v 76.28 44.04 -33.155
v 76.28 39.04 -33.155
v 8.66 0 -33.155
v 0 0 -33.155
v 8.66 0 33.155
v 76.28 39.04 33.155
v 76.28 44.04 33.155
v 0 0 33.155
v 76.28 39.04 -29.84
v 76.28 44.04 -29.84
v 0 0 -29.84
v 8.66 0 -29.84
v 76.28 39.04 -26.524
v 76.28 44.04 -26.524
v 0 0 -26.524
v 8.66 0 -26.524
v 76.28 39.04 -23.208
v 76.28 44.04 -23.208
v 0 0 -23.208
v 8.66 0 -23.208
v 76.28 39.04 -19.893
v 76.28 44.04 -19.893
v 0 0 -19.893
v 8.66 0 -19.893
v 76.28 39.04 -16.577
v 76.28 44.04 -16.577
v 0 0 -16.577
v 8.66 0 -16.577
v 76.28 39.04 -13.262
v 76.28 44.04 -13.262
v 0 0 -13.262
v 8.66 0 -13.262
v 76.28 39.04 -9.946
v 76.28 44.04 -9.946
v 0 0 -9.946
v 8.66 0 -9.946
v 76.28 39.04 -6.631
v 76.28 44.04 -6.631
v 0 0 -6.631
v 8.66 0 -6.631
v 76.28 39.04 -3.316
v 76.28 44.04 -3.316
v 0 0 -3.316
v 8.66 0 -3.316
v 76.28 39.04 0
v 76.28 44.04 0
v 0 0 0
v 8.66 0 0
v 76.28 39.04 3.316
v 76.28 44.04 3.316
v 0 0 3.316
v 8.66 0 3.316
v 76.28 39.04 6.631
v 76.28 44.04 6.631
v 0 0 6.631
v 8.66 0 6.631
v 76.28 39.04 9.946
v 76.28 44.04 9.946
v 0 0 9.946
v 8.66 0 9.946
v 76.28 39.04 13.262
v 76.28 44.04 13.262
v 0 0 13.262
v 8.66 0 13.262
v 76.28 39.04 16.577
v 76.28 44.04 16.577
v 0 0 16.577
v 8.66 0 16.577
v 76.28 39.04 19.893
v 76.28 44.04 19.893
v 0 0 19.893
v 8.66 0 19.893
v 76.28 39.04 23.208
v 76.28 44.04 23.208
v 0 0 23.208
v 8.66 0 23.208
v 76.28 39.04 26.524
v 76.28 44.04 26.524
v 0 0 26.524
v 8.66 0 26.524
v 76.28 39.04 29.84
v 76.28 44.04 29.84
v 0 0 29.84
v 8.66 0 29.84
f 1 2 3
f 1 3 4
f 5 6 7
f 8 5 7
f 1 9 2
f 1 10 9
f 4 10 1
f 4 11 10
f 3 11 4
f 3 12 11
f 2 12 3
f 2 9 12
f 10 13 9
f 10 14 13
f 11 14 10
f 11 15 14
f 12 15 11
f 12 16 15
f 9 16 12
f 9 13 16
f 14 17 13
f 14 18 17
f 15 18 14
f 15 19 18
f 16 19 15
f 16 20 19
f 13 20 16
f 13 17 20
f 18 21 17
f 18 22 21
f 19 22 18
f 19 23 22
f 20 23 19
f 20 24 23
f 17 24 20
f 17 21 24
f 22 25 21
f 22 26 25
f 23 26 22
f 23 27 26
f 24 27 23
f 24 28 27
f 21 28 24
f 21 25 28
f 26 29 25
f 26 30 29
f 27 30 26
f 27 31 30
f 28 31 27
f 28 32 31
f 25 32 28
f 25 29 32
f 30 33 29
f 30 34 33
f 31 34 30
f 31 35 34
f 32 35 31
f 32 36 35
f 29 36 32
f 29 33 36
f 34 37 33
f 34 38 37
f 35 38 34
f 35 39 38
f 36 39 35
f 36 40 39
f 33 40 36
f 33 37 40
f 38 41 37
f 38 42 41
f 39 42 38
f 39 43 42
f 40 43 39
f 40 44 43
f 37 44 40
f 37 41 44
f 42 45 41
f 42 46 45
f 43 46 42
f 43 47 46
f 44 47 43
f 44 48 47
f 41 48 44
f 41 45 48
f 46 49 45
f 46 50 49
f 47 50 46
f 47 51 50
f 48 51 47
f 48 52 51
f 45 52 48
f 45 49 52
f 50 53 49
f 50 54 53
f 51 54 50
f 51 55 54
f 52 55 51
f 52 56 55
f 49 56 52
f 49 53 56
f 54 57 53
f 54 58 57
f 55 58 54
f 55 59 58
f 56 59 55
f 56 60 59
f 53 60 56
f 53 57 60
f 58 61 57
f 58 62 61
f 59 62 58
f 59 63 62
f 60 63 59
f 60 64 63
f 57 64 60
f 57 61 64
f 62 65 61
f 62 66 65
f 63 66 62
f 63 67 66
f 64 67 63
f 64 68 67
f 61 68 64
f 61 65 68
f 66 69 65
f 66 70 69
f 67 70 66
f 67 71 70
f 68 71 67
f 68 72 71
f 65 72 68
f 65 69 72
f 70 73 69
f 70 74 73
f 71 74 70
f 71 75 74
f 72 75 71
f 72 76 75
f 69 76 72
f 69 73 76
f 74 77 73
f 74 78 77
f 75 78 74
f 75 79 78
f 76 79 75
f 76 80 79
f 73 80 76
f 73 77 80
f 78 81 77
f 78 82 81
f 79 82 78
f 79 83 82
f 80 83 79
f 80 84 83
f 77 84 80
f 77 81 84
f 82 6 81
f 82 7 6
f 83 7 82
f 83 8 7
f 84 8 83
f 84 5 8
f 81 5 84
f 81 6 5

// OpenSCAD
// file: calcs.scad
include <inputs.scad>

// CALCS (everything ends up in [mm])
robot_height = robot_height_in*cu-height_edge*cu*2; // height of the robot
robot_width = robot_width_in*cu-side_edge*cu*2; // width of the robot

base_bottom = base_clearance*cu; // height of the bottom of the base
base_top = base_bottom + base_thickness; // height of the top of the base

storage_size = storage_width*cu; // inside depth of storage area
storage_height = robot_height-base_top; // height of storage container
wire_hole = wire_hole_in*cu; // diameter of hole for wires under storage area

dump_height = dump_height_in*cu; // height that platform edge will raise to dump

shaft_width = robot_width - 2*storage_size - 2*thickness; // inside width of elevator shaft


cut_size = (robot_height-dump_height-base_top)/2+tol; // size of vertical cut for sliding together

shift = shaft_width/2 + thickness/2; // how much the pieces need to be shifted to be put together


wheel_opening_width = wheel_d; // width of opening for wheels on sub base
wheel_opening_depth = wheel_w + wheel_opening_depth_tol; // width of opening for wheels on sub base

drive_height = max(mount_motor_hole_offset,wheel_d/2) + max(mount_motor_hole_offset-mount_motor_hole_offset,wheel_d/2); // height of wheel, motor, and mount

sbase_top_height = drive_height + sbase_thickness; // height of the top of the sub base


false_bottom_height = false_bottom_height_in*cu; // height of false bottom in front

false_opening_height = false_opening_height_in*cu; // height of hole for false bottom


cut_height = base_bottom + false_opening_height - base_thickness; // height at which cuts will meet

bottom_cut_height = cut_height - base_top + tol; // height of bottom cut

top_cut_height = robot_height - dump_height - cut_height + tol; // height of top cut

el_step_height = el_step_height_in*cu; // height of steppers for elevator

// Checking
if (shaft_width < storage_size)
{
    echo("<b>THE STORAGE AREAS WILL BE TOO NARROW!!!!!!!!!!!!!!!!!!!!!!!!!!");
    echo("THIS IS A PROBLEM!!!!!!!!!!!!!!!!!!!!!!!!!!");
    echo("Width: ", shaft_width/cu, "[in]");
}
else
{
    echo("<b>Storage width will be:", shaft_width/cu, "[in]</b>");
}

echo("<b>Corner Size:", (robot_width-shaft_width-2*thickness)/2/cu, "[in]</b>");

// error check for sbase and base
if (sbase_top_height >= base_bottom)
{
    echo("<b>SUB BASE TOO TALL!!!!!!!!!!!!!!!!!!!!!!!!!!</b>");
}
else
{
    echo("<b>Spacer height should be:", (base_bottom - sbase_top_height)/cu, "[in]</b>");
}


echo(shaft_width/cu);
echo(storage_size/cu);
// file: inputs.scad
$fn = 50;
cu = 25.4; // inch -> mm

// INPUTS
thickness = 2; // thickness of the acrylic [mm]
base_thickness = 5; // thickness of the base acrylic [mm]

side_edge = 0.25; // clearance for each side of the robot [in]
height_edge = 0.1; // clearance for top and bottom of the robot [in]

robot_height_in = 11; // overall height of the robot [in]
robot_width_in = 9; // overall width of the robot [in]

base_clearance = 2.65; // clearance of the base to ground [in]

storage_width = 2.65; // inside width of storage container [in]

block_width = 5; // width of jigsaw block [mm]

dump_height_in = 1.75; // height that platform edge will raise to dump [in]

tol = 0.001; // number used to fix rounding? [mm]


sbase_thickness = 0; // thickness of the sub base [mm]

wheel_opening_depth_tol = 5; // extra space for wheel depth [mm]

hole_dist_opposing = 33.98; // distance between middles of opposing mounting holes [mm]

hole_dist_adjacent = 6.36; // distance between middles of adjacent mounting holes [mm]

hole_diameter = 3.26; // diameter of mounting holes [mm]

hole_in_spacing = 5; // distance from edge to middle of first mount holes [mm]


servo_length = 41; // lenght of servo [mm]

servo_width = 21; // width of servo [mm]

servo_depth = 37; // height of servo to top plate [mm]

servo_mount_length = 7; // length of servo hole mount (one side) [mm]

servo_wire_clear_length = 12; // length wires protrude from side [mm]

servo_circle_d = 14.5; // diameter of circular protrusion around spline [mm]

servo_circle_offset = 10; // distance from one side to center of spline [mm]


stepper_depth = 40; // depth of stepper [mm]

stepper_lw = 42; // length/width of stepper [mm]

stepper_shaft_ext = 23; // extension of stepper shaft from face [mm]

s_shaft_d = 5; // stepper shaft diameter [mm]

mount_width = 50; // width of motor mount [mm]

mount_mount_hole_offset_w = 15; // distance from center to mount holes for motor mount [mm]

mount_mount_hole_offset_from_back = 11; // distance from back to first mount holes for motor mount [mm]

mount_mount_hole_differential = 30; // distance from first mount hole to second mount hole for motor mount [mm]

mount_mount_hole_d = 4.2; // diameter of mount mount hole[mm]

mount_motor_hole_offset = 31; // distance from top of mount to center of motor hole [mm]

mount_motor_hole_d = 22.1; // diameter of motor hole in mount [mm]

mount_length = 53.5; // length of motor mount [mm]

mount_depth = 51.5; // depth of motor mount [mm]

mount_thickness = 3; // thickness of metal for mount [mm]

wheel_d = 60; // diameter of wheel [mm]

wheel_w = 31; // width of wheel [mm]

wheel_out = 17; // how far out the shaft the wheel starts [mm]

wedge_tol = 1; // tolerance for edges of wedge [mm]

wedge_angle = 30; // angle of wedge from horizontal [deg]

wedge_thickness = 5; // thickness of wedge [mm]


wire_hole_in = 0.5; // size of hole for wires to motors

wire_tri_edge = 5; // thickness of edge on wiring triangle [mm]

false_bottom_height_in = 3; // height of false bottom in front [in]

bottom_clearance = 3; // clearance for walls on bottom of robot [mm]

false_opening_height_in = 3; // height of hole for false bottom [in]


el_step_height_in = 2; // height of steppers for elevator [in]

el_motor_size = 35; // length of elevator stepper motor [mm]

bracket_thickness = 3; // thickness of bracket for elevator stepper [mm]
// main file
include <inputs.scad>
include <calcs.scad>


module wedge()
{
    linear_extrude(height = shaft_width-wedge_tol, center = true, convexity = 0, twist = 0, slices = 20, scale = 1.0, $fn = 16)
        polygon(points = [[0,0],[tan(90-wedge_angle)*wedge_thickness,0],[storage_size-wedge_tol,tan(wedge_angle)*(storage_size-wedge_tol)-wedge_thickness],[storage_size-wedge_tol,tan(wedge_angle)*(storage_size-wedge_tol)]]);
}


module wedge2()
{
    linear_extrude(height = storage_size-wedge_tol, center = true, convexity = 0, twist = 0, slices = 20, scale = 1.0, $fn = 16)
        polygon(points = [[0,0],[tan(90-wedge_angle)*wedge_thickness,0],[shaft_width-wedge_tol,tan(wedge_angle)*(shaft_width-wedge_tol)-wedge_thickness],[shaft_width-wedge_tol,tan(wedge_angle)*(shaft_width-wedge_tol)]]);
}

*wedge();
wedge2();
